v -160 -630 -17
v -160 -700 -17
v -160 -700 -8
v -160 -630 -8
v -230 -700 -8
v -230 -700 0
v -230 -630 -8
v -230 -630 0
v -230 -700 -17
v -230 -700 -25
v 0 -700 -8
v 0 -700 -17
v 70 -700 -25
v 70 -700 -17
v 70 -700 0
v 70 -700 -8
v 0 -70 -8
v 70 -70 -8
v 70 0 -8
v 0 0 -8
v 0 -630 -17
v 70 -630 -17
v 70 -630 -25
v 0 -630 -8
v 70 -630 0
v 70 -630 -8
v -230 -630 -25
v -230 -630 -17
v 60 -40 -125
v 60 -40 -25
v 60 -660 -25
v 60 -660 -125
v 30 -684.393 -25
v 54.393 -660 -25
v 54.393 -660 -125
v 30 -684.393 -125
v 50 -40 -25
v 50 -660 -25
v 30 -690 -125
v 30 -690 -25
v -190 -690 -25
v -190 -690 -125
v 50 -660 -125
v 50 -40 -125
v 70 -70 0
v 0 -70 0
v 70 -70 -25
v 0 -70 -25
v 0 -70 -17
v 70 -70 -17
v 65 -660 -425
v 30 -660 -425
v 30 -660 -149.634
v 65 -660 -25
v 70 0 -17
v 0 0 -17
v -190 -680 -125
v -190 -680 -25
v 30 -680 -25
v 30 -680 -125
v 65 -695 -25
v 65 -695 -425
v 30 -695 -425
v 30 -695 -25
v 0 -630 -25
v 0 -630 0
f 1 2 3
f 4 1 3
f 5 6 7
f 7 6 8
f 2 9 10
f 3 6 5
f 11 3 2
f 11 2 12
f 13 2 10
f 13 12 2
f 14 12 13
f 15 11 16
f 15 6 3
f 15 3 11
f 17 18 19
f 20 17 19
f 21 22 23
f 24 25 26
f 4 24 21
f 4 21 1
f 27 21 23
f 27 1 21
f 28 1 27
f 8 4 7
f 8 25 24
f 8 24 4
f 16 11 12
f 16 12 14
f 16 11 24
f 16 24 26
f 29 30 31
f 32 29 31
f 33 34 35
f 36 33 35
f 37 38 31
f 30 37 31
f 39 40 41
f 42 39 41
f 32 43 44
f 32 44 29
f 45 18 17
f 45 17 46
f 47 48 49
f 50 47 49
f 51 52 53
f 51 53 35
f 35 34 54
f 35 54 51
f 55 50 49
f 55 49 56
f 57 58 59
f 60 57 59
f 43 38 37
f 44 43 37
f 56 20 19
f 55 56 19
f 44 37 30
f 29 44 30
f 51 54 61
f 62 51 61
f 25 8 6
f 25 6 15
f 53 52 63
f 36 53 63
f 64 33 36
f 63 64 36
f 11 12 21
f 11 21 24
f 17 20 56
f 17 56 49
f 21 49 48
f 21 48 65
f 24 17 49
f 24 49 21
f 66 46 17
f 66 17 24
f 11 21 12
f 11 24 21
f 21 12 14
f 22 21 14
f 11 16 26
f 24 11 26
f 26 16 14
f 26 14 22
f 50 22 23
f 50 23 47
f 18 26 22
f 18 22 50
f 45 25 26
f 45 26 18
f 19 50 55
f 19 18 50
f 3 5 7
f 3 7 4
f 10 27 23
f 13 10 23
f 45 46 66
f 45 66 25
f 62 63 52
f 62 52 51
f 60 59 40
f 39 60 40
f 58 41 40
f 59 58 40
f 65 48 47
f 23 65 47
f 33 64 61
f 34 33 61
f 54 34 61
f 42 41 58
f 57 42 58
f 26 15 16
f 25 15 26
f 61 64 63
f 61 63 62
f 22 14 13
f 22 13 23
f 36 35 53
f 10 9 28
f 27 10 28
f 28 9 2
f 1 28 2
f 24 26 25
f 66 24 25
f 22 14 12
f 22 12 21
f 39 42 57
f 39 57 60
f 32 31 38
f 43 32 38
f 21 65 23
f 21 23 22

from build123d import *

# Parameters (mm, degrees)
F0_W      = 70
F0_H      = 70
F0_H_2    = 560
F1_DEPTH  = 25
F2_W      = 70
F2_H      = 8
F3_DEPTH  = 70
F0_W_2    = 160
F4_DEPTH  = 25
F5_W      = 70
F5_H      = 9
F6_DEPTH  = 70
F11_W     = 35
F11_H     = 35
F12_DEPTH = 400
F15_DEPTH = 25
F19_DEPTH = 100
F21_DEPTH = 100


with BuildPart() as f1:
    # F0 (on Top) → F1 (new body)
    with BuildSketch(Plane.XY):
        with Locations((35, -665)):
            Rectangle(F0_W, F0_H)
        with Locations((35, -350)):
            Rectangle(F0_W, F0_H_2)
        with Locations((35, -35)):
            Rectangle(F0_W, F0_H)
    extrude(amount=-F1_DEPTH)

    # F2 (on face) → F3 (cut, through all)
    with BuildSketch(Plane.YZ.offset(70)):
        with Locations((-35, -4)):
            Rectangle(F2_W, F2_H)
        with Locations((-35, -21)):
            Rectangle(F2_W, F2_H)
        with Locations((-665, -4)):
            Rectangle(F2_W, F2_H)
        with Locations((-665, -21)):
            Rectangle(F2_W, F2_H)
    extrude(amount=-F3_DEPTH, mode=Mode.SUBTRACT)


with BuildPart() as f4:
    # F0 (on Top) → F4 (new body, through all)
    with BuildSketch(Plane.XY):
        with Locations((35, -665)):
            Rectangle(F0_W, F0_H)
        with Locations((-80, -665)):
            Rectangle(F0_W_2, F0_H)
        with Locations((-195, -665)):
            Rectangle(F0_W, F0_H)
    extrude(amount=-F4_DEPTH)

    # F5 (on face) → F6 (cut, through all)
    with BuildSketch(Plane.XZ.offset(700)):
        with Locations((35, -12.5)):
            Rectangle(F5_W, F5_H)
        with Locations((-195, -12.5)):
            Rectangle(F5_W, F5_H)
    extrude(amount=-F6_DEPTH, mode=Mode.SUBTRACT)


with BuildPart() as f12:
    # F11 (on face) → F12 (new body)
    with BuildSketch(Plane(origin=(0, 0, -25), x_dir=(1, 0, 0), z_dir=(0, 0, -1))):
        with Locations((47.5, 677.5)):
            Rectangle(F11_W, F11_H)
    extrude(amount=F12_DEPTH)

    # F14 (on face) → F15 (cut, symmetric)
    with BuildSketch(Plane(origin=(-315, -315, 0), x_dir=(-0.7071067812, 0.7071067812, 0), z_dir=(0.7071067812, 0.7071067812, 0))):
        Polygon((-505.1524163602, -125), (-487.9036790187, -149.6337498531), (-487.9036790187, -25), (-505.1524163602, -25), align=None)
    extrude(amount=F15_DEPTH, both=True, mode=Mode.SUBTRACT)


with BuildPart() as f19:
    # F18 (on face) → F19 (new body)
    with BuildSketch(Plane(origin=(0, 0, -25), x_dir=(1, 0, 0), z_dir=(0, 0, -1))):
        Polygon((60, 350), (60, 660), (50, 660), (50, 350), (50, 40), (60, 40), align=None)
    extrude(amount=F19_DEPTH)


with BuildPart() as f21:
    # F20 (on face) → F21 (new body)
    with BuildSketch(Plane(origin=(0, 0, -25), x_dir=(1, 0, 0), z_dir=(0, 0, -1))):
        Polygon((30, 690), (-190, 690), (-190, 680), (-80, 680), (30, 680), align=None)
    extrude(amount=F21_DEPTH)


solid = Compound([f1.part, f4.part, f12.part, f19.part, f21.part])
